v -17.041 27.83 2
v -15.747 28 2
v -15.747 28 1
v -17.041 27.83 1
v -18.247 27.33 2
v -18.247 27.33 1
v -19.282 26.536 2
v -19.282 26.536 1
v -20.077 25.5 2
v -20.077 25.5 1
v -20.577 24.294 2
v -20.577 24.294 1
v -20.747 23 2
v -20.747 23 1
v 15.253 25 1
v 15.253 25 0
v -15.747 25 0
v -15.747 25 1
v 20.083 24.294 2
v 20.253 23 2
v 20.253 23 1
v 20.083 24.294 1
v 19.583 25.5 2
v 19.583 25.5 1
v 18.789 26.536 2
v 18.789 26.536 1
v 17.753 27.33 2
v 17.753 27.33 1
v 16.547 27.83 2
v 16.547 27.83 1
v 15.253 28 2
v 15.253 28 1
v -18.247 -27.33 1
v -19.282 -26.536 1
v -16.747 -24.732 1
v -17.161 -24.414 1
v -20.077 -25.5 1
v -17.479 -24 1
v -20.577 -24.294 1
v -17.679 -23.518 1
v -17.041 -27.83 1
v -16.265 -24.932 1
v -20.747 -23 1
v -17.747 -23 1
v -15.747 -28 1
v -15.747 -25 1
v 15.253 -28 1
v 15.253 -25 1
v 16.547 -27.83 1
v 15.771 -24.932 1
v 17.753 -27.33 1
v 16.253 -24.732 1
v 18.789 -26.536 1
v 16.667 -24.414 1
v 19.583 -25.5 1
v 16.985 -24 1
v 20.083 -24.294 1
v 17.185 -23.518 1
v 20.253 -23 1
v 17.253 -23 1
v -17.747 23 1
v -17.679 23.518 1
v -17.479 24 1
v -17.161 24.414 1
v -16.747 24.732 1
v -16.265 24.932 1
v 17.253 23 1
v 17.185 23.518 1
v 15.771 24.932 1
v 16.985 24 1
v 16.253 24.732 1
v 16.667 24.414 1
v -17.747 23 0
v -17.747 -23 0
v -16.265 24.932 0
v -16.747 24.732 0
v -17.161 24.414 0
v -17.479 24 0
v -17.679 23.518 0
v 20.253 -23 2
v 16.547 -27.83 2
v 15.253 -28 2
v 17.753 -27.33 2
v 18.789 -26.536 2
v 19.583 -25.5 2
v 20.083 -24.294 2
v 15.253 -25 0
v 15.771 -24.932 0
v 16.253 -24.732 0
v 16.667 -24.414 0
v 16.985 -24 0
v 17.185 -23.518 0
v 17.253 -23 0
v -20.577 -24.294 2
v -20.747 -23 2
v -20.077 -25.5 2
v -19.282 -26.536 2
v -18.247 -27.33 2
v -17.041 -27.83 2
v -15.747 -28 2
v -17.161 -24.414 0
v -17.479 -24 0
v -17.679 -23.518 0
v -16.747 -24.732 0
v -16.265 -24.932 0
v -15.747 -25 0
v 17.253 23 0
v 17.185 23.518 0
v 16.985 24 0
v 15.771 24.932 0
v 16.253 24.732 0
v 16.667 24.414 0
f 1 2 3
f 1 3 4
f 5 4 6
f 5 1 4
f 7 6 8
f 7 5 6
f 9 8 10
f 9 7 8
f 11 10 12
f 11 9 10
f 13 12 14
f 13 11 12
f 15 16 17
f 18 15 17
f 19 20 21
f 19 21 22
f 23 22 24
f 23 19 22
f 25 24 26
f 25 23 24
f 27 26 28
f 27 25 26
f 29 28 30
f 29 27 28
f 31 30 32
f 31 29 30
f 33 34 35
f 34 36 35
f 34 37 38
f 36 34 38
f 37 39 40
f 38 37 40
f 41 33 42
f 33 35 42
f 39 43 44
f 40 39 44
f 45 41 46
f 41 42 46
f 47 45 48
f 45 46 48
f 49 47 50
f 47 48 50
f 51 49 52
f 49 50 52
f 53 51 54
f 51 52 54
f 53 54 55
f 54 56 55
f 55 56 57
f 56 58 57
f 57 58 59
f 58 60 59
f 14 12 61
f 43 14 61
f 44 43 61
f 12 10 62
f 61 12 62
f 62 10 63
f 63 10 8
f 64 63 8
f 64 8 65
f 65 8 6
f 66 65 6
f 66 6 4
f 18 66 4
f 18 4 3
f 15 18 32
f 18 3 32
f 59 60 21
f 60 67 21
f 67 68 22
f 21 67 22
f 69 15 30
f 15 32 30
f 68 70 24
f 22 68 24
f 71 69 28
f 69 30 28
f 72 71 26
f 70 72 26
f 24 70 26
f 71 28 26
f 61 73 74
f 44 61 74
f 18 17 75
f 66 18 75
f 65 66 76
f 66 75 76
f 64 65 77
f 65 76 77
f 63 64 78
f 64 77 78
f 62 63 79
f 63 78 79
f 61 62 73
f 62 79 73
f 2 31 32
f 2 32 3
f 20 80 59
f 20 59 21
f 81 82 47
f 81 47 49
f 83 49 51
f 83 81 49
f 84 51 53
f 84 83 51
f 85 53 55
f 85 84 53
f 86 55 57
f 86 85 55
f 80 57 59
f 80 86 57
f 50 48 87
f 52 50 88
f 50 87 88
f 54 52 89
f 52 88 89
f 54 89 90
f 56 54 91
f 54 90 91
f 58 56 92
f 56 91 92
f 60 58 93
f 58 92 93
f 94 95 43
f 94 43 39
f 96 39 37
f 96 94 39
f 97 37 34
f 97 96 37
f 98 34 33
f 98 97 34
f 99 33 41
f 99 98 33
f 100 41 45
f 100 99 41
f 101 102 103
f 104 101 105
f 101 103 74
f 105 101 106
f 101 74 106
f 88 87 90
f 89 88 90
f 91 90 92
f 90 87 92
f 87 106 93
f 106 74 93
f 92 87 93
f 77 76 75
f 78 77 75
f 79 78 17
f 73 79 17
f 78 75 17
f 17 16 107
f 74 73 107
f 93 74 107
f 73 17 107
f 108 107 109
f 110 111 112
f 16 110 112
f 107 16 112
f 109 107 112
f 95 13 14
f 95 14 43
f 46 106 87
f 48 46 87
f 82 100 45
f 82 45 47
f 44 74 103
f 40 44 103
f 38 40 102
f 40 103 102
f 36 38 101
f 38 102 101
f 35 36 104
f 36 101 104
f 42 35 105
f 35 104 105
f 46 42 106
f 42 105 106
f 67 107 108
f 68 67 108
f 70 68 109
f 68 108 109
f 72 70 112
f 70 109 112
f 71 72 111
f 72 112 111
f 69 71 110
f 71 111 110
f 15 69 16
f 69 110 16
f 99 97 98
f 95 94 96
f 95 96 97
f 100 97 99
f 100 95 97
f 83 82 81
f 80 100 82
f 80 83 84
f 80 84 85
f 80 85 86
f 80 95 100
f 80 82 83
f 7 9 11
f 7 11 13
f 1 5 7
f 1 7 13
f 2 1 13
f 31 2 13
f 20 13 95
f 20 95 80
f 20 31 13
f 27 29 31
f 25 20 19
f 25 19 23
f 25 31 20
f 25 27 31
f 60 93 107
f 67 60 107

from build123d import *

# Parameters (mm, degrees)
F1_DEPTH = 2
F3_DEPTH = 1


with BuildPart() as f1:
    # F0 (on Top) → F1 (new body)
    with BuildSketch(Plane.XY):
        with BuildLine():
            ThreePointArc((-17.746939, -22.999996), (-17.161152, -24.41421), (-15.746939, -24.999996))
            Line((-15.746939, -24.999996), (15.253061, -24.999996))
            ThreePointArc((15.253061, -24.999996), (16.667275, -24.41421), (17.253061, -22.999996))
            Line((17.253061, -22.999996), (17.253061, 23.000004))
            ThreePointArc((17.253061, 23.000004), (16.667275, 24.414217), (15.253061, 25.000004))
            Line((15.253061, 25.000004), (-15.746939, 25.000004))
            ThreePointArc((-15.746939, 25.000004), (-17.161152, 24.414217), (-17.746939, 23.000004))
            Line((-17.746939, 23.000004), (-17.746939, -22.999996))
        make_face()
    extrude(amount=F1_DEPTH)

    # F2 (on face) → F3 (join)
    with BuildSketch(Plane.XY.offset(2)):
        with BuildLine():
            Line((20.253061, -22.999996), (20.253061, 23.000004))
            ThreePointArc((20.253061, 23.000004), (18.788595, 26.535538), (15.253061, 28.000004))
            Line((15.253061, 28.000004), (-15.746939, 28.000004))
            ThreePointArc((-15.746939, 28.000004), (-19.282472, 26.535538), (-20.746939, 23.000004))
            Line((-20.746939, 23.000004), (-20.746939, -22.999996))
            ThreePointArc((-20.746939, -22.999996), (-19.282472, -26.53553), (-15.746939, -27.999996))
            Line((-15.746939, -27.999996), (15.253061, -27.999996))
            ThreePointArc((15.253061, -27.999996), (18.788595, -26.53553), (20.253061, -22.999996))
        make_face()
    extrude(amount=-F3_DEPTH)


solid = f1.part
